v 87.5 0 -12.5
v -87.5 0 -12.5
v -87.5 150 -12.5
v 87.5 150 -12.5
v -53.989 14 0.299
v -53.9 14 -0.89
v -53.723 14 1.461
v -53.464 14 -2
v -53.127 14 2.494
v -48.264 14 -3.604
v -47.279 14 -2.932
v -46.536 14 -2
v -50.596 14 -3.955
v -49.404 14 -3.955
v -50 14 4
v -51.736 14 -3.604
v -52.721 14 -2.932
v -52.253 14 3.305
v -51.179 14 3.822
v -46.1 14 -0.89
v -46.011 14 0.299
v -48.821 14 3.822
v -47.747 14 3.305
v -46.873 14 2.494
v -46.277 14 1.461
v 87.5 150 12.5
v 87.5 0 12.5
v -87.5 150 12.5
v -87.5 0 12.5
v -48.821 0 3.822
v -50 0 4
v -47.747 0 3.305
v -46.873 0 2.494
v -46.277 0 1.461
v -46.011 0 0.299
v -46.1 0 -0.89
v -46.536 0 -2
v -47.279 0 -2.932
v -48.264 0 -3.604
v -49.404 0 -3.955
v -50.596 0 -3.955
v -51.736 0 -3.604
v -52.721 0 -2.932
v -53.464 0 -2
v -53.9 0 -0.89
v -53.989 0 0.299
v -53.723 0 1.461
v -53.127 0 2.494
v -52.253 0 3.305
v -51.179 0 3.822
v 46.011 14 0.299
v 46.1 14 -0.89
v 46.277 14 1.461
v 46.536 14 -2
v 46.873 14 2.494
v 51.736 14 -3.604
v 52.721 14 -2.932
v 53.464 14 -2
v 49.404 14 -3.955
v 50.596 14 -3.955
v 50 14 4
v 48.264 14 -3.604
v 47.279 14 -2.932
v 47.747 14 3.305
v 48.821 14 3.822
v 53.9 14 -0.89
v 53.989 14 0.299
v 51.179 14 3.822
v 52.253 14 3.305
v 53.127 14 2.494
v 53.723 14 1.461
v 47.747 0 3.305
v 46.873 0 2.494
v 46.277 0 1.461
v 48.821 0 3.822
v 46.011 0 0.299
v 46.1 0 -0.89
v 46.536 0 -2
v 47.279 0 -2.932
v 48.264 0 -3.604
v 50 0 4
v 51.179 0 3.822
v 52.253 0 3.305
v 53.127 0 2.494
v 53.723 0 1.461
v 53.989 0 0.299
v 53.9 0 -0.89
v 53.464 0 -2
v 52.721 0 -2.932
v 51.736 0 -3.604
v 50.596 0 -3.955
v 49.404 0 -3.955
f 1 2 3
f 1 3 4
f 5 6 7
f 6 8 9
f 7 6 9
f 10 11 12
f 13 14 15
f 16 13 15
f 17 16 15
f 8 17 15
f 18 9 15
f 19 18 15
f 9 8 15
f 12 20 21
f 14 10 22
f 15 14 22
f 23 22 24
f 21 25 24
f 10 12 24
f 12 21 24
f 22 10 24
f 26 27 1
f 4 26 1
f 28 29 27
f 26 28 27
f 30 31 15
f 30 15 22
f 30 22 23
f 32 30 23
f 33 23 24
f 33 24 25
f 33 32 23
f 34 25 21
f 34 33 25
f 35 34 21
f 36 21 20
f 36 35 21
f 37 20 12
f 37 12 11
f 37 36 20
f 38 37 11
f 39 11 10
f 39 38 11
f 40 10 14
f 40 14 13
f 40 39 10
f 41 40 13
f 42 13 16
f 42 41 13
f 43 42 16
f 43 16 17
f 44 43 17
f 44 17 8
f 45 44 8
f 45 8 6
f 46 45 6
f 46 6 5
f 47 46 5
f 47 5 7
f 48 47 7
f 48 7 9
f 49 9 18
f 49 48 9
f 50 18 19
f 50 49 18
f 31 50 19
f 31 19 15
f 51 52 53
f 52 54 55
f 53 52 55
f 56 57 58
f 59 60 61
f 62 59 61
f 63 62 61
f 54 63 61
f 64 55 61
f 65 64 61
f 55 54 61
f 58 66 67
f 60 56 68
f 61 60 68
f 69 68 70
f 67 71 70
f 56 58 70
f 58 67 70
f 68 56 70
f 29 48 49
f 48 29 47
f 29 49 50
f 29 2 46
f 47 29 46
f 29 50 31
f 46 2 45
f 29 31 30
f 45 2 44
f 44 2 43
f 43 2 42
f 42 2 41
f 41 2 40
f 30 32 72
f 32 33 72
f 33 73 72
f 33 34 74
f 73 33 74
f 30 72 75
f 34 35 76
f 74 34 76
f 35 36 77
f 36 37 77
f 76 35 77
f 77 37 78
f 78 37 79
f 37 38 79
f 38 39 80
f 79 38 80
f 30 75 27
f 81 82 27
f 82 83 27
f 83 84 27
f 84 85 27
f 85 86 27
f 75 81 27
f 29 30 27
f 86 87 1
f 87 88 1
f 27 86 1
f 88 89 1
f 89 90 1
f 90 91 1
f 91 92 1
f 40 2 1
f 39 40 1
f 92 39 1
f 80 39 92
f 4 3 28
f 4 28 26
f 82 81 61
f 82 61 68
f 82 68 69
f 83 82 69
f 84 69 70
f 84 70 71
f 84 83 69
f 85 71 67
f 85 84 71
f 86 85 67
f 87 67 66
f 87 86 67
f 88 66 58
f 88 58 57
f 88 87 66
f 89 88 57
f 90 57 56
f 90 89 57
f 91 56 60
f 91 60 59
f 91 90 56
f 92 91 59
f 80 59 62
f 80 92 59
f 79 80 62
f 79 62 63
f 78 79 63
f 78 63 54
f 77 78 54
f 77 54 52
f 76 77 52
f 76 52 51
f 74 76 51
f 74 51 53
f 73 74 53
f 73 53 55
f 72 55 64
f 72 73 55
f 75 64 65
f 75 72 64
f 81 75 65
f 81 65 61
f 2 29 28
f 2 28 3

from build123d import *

# Parameters (mm, degrees)
CROQUIS_BASE_W             = 175
CROQUIS_BASE_H             = 25
MURO_DEPTH                 = 150
CROQUIS_AGUJEROS_MONTAJE_R = 4
AGUJERO_INSERTO_M6_DEPTH   = 14


with BuildPart() as part:
    # Croquis_base → Muro (new body)
    with BuildSketch(Plane(origin=(0, 0, 0), x_dir=(1, 0, 0), z_dir=(0, 1, 0))):
        Rectangle(CROQUIS_BASE_W, CROQUIS_BASE_H)
    extrude(amount=MURO_DEPTH)

    # Croquis_agujeros_montaje → Agujero_inserto_M6 (cut)
    with BuildSketch(Plane(origin=(0, 0, 0), x_dir=(1, 0, 0), z_dir=(0, 1, 0))):
        with Locations(Location((-50, 0, 0), (0, 0, 270))):
            Circle(CROQUIS_AGUJEROS_MONTAJE_R)
        with Locations(Location((50, 0, 0), (0, 0, 270))):
            Circle(CROQUIS_AGUJEROS_MONTAJE_R)
    extrude(amount=AGUJERO_INSERTO_M6_DEPTH, mode=Mode.SUBTRACT)


solid = part.part
